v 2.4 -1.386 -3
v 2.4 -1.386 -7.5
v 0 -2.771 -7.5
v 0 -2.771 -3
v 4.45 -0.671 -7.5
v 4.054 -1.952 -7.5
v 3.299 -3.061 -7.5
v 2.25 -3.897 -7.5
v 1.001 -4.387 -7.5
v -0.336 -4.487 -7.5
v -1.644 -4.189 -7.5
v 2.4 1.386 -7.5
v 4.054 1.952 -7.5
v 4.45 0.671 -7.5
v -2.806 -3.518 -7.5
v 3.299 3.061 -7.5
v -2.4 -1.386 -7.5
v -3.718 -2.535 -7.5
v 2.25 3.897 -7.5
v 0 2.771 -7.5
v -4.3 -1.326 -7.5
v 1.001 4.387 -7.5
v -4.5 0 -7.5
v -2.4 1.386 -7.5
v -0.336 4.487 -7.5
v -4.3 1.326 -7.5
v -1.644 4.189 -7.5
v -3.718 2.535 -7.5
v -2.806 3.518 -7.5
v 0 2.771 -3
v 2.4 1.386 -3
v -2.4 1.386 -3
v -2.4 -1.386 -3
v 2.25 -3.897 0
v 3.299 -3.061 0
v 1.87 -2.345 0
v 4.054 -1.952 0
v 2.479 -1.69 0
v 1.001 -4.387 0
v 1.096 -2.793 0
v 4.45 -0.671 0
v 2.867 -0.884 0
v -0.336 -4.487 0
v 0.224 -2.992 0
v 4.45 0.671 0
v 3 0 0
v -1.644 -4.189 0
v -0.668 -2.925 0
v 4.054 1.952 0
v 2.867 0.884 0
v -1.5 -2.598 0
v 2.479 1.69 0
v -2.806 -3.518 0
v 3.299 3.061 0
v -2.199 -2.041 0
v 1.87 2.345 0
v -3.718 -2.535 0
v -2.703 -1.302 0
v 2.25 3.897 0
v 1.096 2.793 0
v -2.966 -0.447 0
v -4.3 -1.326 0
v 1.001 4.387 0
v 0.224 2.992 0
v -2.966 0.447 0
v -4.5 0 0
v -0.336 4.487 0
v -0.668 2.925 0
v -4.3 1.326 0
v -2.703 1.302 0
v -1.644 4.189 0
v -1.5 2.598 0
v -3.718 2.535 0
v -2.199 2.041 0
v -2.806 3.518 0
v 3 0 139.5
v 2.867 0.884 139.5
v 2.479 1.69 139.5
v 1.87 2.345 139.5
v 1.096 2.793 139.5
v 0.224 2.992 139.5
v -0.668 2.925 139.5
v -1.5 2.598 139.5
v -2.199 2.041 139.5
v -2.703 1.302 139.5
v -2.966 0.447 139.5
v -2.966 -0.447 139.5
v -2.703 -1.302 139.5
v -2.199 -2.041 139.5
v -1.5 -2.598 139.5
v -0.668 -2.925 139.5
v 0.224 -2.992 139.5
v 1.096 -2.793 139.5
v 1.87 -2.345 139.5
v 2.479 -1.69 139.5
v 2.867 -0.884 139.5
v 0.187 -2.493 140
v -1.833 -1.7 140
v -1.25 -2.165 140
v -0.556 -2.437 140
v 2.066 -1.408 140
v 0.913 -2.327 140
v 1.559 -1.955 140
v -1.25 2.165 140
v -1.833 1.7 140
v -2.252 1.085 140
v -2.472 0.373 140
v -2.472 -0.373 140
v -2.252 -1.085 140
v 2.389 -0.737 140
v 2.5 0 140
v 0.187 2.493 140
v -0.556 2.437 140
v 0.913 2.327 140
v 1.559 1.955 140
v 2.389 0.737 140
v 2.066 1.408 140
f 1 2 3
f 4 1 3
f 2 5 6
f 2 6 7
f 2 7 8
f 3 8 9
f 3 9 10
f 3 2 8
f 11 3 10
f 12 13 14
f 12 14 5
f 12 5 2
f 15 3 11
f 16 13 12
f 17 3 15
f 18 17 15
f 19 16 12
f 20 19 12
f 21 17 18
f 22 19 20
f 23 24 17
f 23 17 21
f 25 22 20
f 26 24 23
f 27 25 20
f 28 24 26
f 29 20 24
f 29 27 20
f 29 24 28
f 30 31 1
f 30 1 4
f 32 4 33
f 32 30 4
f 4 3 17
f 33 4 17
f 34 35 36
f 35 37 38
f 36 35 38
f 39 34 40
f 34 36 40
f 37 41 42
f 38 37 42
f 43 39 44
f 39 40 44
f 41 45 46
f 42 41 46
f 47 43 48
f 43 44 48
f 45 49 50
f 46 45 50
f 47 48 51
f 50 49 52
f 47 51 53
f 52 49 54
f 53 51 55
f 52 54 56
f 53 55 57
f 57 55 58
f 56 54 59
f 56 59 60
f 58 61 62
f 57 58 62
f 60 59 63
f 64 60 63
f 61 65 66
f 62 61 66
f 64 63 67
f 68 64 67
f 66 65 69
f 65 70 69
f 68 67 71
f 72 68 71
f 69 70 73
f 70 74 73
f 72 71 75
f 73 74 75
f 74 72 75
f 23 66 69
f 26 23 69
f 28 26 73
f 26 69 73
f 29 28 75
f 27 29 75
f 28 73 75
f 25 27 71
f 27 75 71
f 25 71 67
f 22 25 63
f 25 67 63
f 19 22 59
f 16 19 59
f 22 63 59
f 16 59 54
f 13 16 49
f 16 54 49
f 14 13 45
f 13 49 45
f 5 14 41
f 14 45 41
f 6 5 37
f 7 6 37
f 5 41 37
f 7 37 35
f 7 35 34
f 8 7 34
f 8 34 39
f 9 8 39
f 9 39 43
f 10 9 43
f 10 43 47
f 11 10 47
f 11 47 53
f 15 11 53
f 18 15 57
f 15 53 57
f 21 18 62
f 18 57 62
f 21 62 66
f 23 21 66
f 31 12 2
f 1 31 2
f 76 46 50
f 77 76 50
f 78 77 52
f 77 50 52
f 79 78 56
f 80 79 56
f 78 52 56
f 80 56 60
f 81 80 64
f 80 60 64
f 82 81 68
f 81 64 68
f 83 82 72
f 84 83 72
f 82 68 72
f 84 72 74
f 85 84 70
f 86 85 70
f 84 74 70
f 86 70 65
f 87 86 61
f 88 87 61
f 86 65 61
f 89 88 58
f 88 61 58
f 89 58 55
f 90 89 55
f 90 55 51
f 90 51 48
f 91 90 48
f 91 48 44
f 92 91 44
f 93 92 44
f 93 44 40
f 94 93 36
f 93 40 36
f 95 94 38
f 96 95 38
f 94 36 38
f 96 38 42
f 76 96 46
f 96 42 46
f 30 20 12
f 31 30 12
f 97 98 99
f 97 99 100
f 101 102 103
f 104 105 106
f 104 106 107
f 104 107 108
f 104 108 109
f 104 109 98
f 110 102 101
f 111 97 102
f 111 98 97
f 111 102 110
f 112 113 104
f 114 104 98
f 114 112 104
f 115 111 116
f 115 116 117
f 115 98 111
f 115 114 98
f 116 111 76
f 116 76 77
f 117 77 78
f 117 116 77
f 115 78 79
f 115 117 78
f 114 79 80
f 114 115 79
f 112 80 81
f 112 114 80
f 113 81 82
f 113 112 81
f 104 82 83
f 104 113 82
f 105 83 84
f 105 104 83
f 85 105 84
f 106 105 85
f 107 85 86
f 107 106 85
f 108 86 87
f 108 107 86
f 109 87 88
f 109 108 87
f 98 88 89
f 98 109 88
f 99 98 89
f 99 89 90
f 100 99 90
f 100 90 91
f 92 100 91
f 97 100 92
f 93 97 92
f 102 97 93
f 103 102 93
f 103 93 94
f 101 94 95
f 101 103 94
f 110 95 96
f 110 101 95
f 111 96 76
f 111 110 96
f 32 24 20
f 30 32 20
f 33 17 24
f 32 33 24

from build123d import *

# Parameters (mm, degrees)
SKICA1_R                 = 3
P_IDAT_VYSUNUT_M1_DEPTH  = 140
SKICA2_R                 = 4.5
P_IDAT_VYSUNUT_M2_DEPTH  = 7.5
ODEBRAT_VYSUNUT_M1_DEPTH = 4.5
ZKOSEN_1_SIZE            = 0.5


with BuildPart() as part:
    # Skica1 → Přidat vysunutím1 (new body)
    with BuildSketch(Plane.XY):
        Circle(SKICA1_R)
    extrude(amount=P_IDAT_VYSUNUT_M1_DEPTH)

    # Skica2 → Přidat vysunutím2 (add)
    with BuildSketch(Plane(origin=(0, 0, 0), x_dir=(-1, 0, 0), z_dir=(0, 0, -1))):
        Circle(SKICA2_R)
    extrude(amount=P_IDAT_VYSUNUT_M2_DEPTH)

    # Skica3 → Odebrat vysunutím1 (cut)
    with BuildSketch(Plane(origin=(0, 0, -7.5), x_dir=(-1, 0, 0), z_dir=(0, 0, -1))):
        Polygon((0, -2.771281292), (2.4, -1.385640646), (2.4, 1.385640646), (0, 2.771281292), (-2.4, 1.385640646), (-2.4, -1.385640646), align=None)
    extrude(amount=-ODEBRAT_VYSUNUT_M1_DEPTH, mode=Mode.SUBTRACT)

    # Zkosení1
    zkosen_1_edges = [part.edges().sort_by_distance(p)[0] for p in [
        (-3, 0, 140),
    ]]
    chamfer(zkosen_1_edges, length=ZKOSEN_1_SIZE)


solid = part.part
